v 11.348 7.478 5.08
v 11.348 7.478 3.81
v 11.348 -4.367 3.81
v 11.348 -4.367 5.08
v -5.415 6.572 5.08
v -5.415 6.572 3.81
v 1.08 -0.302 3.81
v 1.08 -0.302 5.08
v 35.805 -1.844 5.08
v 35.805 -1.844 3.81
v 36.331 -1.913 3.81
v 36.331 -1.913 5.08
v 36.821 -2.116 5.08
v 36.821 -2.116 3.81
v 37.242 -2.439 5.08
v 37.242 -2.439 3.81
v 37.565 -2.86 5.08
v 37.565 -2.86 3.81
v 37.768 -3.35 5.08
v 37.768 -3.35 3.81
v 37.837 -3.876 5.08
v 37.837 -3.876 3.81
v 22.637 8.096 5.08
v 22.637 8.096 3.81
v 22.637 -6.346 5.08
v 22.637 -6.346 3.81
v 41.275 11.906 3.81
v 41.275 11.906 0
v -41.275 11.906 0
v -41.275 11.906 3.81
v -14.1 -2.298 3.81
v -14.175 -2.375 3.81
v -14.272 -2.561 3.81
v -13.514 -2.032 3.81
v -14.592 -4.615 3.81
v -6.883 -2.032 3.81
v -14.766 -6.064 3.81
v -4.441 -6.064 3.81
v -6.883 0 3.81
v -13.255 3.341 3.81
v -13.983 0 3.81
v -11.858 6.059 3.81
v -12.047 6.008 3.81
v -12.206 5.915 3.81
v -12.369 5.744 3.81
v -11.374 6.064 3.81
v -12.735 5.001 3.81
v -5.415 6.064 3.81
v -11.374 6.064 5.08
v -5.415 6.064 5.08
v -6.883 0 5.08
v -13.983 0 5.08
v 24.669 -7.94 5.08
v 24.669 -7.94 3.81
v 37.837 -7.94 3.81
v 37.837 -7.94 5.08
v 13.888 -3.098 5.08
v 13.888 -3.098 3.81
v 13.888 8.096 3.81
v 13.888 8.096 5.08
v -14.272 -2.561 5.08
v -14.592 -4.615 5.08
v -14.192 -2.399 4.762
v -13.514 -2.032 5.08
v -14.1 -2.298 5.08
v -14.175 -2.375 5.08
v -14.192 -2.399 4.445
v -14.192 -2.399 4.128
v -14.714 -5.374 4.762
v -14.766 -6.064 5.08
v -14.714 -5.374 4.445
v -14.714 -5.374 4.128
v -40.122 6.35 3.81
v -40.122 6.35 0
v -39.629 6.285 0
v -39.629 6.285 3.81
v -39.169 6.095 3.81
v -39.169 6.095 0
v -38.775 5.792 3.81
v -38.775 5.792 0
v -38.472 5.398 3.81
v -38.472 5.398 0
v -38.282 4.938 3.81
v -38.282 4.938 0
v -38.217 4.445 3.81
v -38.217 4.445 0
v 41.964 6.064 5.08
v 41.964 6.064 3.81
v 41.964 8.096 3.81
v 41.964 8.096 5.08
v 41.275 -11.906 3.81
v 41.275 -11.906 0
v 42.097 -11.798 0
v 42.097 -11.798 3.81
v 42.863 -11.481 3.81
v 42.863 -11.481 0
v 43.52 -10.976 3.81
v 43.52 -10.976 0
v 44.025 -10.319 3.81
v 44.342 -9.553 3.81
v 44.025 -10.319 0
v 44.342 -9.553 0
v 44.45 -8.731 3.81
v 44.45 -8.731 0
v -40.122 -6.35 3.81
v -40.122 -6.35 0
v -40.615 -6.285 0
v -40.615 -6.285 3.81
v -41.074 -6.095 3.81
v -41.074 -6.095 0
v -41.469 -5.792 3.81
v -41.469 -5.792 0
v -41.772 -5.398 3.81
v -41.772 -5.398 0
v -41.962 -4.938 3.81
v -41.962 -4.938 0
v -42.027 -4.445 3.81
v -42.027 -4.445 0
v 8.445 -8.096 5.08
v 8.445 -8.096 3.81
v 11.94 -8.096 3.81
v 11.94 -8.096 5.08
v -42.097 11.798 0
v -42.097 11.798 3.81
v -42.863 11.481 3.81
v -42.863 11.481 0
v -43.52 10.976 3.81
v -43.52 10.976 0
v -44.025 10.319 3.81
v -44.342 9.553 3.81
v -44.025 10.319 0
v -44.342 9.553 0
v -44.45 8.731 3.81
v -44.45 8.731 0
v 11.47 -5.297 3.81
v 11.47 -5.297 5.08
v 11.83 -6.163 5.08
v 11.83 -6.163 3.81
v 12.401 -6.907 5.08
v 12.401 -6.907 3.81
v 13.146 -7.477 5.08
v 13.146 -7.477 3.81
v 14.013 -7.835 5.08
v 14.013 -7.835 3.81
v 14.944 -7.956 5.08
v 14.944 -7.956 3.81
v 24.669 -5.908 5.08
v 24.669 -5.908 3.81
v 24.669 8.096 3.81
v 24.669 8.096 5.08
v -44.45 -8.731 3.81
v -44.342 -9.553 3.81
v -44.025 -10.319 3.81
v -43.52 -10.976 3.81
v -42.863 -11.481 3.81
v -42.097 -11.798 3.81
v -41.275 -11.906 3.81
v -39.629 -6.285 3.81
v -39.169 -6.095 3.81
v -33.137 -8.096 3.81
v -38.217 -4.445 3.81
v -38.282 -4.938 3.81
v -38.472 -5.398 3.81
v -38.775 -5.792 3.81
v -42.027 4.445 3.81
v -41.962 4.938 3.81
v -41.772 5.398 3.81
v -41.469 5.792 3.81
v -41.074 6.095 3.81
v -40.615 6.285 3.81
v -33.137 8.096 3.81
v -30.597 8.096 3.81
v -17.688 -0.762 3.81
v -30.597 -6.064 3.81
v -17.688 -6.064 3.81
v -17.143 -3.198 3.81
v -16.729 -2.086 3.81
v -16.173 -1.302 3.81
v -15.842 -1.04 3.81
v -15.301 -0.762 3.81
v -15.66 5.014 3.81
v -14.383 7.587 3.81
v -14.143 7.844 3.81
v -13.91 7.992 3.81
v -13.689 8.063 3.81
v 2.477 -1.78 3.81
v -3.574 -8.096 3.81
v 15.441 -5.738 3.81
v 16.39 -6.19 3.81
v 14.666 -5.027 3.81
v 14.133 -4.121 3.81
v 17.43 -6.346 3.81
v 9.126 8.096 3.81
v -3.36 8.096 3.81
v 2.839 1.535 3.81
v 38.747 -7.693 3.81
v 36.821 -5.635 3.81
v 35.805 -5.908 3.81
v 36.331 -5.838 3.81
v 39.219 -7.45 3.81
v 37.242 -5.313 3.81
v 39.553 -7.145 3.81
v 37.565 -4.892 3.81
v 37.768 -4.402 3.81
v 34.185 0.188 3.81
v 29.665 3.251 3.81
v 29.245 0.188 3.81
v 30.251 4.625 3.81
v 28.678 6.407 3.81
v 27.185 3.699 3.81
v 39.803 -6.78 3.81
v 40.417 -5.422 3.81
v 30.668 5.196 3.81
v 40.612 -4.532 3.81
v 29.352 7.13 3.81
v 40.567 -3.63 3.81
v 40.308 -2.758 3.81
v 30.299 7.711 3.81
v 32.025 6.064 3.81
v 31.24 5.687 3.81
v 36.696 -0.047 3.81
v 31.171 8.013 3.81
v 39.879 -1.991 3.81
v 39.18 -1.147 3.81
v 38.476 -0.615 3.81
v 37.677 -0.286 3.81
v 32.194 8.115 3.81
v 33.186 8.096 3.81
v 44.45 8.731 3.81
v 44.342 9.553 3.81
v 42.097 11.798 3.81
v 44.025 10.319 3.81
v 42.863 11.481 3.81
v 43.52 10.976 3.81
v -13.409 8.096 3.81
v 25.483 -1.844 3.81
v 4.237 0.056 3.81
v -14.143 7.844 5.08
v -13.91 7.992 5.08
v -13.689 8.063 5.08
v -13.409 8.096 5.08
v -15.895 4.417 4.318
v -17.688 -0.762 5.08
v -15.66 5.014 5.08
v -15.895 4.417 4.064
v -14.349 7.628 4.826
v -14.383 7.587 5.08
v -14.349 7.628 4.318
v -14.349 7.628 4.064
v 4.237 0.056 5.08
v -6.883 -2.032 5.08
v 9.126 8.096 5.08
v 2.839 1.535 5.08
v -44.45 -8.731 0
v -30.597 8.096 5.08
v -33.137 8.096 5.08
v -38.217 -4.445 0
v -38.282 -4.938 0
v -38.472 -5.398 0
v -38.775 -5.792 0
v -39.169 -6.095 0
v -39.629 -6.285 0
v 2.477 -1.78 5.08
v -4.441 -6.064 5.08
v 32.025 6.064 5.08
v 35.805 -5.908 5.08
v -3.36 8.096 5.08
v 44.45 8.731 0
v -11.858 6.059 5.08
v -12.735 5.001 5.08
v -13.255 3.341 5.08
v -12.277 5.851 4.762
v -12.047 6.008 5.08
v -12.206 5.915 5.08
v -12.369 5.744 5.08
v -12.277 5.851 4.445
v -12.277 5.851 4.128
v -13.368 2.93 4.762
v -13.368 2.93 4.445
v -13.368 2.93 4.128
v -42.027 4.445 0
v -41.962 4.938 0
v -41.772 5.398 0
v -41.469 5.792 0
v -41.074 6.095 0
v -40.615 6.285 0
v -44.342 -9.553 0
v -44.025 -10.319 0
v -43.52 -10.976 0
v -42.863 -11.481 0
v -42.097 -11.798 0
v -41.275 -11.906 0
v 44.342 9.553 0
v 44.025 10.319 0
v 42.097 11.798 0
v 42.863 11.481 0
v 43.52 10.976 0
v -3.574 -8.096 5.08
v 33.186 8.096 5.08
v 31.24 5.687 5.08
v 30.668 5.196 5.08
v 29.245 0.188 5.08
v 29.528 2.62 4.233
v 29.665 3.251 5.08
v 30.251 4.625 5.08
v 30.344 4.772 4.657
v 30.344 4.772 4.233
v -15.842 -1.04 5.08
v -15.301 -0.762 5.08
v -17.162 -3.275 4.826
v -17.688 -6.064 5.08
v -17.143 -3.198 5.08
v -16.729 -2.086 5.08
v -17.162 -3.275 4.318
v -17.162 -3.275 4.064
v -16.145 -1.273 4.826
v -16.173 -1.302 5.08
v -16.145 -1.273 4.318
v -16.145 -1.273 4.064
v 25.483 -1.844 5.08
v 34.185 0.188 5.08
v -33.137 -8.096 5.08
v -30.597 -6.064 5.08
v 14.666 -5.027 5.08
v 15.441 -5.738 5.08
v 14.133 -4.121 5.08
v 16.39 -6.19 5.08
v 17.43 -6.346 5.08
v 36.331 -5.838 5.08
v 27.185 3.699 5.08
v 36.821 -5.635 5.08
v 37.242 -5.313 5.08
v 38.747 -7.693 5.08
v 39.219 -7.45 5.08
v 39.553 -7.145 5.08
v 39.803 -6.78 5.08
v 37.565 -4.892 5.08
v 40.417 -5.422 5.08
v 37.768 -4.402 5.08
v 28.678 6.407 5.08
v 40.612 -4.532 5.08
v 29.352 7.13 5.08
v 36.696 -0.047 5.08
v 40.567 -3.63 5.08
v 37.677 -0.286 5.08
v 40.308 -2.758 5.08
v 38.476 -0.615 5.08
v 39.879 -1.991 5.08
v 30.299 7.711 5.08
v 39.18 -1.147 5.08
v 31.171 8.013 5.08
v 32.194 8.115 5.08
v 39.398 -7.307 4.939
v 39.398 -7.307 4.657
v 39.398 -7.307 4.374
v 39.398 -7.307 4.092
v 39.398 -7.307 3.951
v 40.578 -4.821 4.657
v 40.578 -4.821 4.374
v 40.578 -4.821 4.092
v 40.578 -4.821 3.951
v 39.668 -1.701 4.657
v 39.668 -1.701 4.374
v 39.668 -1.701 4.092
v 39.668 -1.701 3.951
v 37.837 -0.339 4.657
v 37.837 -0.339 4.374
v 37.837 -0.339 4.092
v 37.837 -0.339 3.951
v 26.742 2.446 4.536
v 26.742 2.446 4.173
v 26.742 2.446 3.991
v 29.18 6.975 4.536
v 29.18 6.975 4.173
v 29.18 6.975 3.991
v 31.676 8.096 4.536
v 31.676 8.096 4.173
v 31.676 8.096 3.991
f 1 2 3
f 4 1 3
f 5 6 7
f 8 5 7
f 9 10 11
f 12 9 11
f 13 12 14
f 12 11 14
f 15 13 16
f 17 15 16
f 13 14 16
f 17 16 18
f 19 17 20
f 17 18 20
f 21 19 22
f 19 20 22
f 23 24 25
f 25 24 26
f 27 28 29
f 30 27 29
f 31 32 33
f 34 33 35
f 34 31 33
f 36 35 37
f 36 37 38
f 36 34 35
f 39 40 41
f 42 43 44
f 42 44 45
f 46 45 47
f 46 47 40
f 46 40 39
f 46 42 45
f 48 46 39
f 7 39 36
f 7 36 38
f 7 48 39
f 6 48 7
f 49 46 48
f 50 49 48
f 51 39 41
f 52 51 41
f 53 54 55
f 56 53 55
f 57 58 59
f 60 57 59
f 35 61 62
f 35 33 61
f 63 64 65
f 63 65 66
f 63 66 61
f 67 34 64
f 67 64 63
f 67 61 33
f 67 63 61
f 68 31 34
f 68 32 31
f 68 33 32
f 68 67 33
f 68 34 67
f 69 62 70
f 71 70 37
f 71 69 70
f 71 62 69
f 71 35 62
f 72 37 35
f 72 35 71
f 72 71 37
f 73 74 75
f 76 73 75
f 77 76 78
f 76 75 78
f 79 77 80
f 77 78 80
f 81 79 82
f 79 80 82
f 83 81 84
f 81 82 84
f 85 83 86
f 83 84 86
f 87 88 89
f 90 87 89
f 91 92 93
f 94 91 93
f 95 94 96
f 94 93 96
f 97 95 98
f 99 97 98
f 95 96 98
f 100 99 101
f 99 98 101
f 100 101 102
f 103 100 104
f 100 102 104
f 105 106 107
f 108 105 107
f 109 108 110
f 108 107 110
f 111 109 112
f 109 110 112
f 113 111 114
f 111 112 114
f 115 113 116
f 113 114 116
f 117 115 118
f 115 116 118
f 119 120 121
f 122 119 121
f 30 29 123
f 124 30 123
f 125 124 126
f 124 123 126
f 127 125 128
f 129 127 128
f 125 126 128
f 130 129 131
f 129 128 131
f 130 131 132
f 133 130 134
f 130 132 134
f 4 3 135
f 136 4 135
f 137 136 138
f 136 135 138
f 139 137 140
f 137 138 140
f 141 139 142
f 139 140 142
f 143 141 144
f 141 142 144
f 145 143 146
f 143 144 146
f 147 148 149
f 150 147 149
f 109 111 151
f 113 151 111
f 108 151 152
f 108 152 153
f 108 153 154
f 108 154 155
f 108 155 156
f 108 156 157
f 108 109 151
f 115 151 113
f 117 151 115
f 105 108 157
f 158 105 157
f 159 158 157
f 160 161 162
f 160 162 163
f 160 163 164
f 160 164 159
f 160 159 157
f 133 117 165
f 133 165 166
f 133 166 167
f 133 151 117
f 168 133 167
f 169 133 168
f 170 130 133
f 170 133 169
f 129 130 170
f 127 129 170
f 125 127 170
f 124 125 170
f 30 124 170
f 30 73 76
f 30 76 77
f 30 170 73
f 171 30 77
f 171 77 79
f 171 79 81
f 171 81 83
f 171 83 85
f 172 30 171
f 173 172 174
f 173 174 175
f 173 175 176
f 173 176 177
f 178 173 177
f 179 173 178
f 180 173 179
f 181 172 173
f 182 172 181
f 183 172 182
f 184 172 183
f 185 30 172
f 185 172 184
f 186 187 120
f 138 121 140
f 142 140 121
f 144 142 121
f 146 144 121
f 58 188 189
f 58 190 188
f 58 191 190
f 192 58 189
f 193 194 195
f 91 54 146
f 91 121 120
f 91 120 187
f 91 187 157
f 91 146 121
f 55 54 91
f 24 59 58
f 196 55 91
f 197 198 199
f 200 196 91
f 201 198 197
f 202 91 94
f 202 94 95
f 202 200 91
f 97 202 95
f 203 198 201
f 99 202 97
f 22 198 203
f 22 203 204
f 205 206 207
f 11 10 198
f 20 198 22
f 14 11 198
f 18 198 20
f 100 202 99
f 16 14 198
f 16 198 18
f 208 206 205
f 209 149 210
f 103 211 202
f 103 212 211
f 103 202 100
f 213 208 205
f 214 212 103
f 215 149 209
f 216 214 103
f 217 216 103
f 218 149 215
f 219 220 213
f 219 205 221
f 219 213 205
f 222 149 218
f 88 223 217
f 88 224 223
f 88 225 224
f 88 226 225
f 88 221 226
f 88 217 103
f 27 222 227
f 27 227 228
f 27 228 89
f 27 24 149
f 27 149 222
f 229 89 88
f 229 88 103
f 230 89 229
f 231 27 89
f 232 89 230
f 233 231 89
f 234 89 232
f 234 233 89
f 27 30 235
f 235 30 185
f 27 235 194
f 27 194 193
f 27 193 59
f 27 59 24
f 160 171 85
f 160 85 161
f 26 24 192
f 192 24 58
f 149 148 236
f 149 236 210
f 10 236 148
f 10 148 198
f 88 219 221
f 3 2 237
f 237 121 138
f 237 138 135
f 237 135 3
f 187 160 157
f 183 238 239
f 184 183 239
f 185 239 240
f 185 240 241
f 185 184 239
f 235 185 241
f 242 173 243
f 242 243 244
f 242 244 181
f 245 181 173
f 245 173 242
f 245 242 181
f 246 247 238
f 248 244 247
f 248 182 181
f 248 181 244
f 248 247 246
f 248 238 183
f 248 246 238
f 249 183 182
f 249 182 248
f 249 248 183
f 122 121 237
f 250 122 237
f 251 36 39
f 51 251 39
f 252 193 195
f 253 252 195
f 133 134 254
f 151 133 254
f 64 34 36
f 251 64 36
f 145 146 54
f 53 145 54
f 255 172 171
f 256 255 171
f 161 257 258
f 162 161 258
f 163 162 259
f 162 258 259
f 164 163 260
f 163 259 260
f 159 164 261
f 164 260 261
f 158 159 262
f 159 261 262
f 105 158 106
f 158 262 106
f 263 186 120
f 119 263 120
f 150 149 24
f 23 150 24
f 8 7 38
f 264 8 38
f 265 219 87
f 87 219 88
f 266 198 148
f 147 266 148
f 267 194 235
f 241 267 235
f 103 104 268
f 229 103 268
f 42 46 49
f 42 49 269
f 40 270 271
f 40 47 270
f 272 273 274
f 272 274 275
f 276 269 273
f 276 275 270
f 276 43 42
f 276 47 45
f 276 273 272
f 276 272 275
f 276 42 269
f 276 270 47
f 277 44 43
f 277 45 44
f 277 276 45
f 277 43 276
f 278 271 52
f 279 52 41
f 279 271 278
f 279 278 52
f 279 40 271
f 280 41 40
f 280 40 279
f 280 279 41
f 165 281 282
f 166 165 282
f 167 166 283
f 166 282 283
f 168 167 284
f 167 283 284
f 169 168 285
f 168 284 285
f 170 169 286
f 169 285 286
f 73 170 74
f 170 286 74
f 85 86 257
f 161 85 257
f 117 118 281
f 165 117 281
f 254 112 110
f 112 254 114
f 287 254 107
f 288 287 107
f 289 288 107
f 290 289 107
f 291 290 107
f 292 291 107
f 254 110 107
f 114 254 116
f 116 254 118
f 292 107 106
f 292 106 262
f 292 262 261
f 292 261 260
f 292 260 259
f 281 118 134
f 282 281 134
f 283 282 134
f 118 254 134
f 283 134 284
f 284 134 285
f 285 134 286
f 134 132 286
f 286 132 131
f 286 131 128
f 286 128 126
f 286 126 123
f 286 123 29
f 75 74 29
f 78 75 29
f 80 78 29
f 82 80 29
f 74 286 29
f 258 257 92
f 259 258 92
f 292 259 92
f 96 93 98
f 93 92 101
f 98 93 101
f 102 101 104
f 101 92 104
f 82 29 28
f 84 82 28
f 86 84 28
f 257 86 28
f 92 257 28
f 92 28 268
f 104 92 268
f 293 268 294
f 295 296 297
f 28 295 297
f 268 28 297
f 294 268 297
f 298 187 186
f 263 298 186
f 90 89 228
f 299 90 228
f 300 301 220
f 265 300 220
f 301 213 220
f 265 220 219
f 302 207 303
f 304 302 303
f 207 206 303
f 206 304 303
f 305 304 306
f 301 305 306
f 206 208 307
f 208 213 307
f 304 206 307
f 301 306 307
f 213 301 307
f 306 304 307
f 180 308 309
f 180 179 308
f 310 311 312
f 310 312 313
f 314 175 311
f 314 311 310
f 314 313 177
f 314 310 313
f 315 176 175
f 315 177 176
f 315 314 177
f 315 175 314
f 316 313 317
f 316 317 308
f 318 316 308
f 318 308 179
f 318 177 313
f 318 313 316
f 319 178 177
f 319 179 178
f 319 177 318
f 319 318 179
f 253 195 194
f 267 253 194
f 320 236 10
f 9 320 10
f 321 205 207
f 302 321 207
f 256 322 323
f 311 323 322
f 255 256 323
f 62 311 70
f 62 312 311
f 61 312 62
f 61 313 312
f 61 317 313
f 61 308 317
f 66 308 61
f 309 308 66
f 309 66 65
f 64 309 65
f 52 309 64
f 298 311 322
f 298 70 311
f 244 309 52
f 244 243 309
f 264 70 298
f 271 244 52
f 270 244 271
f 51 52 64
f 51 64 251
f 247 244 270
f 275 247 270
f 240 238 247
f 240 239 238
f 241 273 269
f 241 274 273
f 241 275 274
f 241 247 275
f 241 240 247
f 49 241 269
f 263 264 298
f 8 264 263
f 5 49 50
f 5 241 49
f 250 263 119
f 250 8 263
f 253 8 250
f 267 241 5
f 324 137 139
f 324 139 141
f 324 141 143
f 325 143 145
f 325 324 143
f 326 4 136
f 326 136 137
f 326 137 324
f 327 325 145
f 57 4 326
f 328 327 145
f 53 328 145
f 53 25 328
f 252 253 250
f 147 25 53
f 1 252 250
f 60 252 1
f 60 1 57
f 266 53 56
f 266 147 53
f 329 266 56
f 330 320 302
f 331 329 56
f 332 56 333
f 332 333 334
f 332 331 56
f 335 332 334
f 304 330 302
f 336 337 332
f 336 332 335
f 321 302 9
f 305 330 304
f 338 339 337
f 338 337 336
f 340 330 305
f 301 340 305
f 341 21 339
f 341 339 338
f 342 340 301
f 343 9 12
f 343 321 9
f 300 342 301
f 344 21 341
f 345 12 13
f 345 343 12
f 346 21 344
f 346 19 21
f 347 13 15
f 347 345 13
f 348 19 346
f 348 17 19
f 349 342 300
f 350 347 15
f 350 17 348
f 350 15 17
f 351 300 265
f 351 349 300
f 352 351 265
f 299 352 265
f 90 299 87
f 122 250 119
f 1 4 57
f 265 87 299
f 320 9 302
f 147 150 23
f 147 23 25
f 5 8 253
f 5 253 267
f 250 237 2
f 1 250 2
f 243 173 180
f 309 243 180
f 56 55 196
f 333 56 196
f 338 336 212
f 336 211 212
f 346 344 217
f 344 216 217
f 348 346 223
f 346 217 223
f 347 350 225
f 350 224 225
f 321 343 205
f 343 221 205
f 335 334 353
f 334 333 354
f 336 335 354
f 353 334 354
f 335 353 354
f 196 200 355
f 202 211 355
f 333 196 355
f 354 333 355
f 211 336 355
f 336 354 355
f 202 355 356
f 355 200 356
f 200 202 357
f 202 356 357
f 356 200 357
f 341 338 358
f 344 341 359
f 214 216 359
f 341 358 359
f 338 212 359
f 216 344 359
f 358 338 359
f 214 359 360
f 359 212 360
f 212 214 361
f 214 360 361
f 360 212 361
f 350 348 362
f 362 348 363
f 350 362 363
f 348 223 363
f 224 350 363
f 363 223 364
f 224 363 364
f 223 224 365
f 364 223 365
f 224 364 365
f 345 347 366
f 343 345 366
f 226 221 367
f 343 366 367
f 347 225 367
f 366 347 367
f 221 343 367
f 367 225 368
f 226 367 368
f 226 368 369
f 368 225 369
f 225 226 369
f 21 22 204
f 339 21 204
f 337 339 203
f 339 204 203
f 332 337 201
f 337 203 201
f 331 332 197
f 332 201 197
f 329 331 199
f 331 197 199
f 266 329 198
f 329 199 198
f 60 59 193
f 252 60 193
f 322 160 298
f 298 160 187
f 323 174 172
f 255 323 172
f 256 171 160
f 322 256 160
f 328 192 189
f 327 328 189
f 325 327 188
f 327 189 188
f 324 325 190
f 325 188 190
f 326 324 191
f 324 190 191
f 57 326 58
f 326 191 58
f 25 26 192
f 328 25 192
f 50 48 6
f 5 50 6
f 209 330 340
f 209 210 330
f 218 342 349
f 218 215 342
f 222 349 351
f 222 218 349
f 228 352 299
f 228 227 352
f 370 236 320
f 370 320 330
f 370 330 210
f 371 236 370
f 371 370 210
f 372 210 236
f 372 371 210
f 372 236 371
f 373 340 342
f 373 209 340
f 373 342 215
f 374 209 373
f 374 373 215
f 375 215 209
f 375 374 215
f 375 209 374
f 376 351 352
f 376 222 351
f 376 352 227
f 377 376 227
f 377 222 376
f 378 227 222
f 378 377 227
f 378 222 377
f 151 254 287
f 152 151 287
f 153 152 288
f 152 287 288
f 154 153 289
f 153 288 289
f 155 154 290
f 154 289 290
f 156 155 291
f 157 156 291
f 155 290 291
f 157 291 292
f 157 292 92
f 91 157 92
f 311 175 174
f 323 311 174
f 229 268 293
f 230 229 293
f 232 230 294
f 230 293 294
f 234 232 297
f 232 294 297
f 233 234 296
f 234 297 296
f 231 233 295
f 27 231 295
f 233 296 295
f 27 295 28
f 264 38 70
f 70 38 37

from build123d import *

# Parameters (mm, degrees)
F1_DEPTH = 3.81
F3_DEPTH = 1.27


with BuildPart() as f1:
    # F0 (on Top) → F1 (new body)
    with BuildSketch(Plane.XY):
        with BuildLine():
            Line((-41.275, -11.90625), (41.275, -11.90625))
            ThreePointArc((41.275, -11.90625), (43.5200640303, -10.9763140303), (44.45, -8.73125))
            Line((44.45, -8.73125), (44.45, 8.73125))
            ThreePointArc((44.45, 8.73125), (43.5200640303, 10.9763140303), (41.275, 11.90625))
            Line((41.275, 11.90625), (-41.275, 11.90625))
            ThreePointArc((-41.275, 11.90625), (-43.5200640303, 10.9763140303), (-44.45, 8.73125))
            Line((-44.45, 8.73125), (-44.45, -8.73125))
            ThreePointArc((-44.45, -8.73125), (-43.5200640303, -10.9763140303), (-41.275, -11.90625))
        make_face()
        with BuildLine():
            Line((-38.2169688356, 4.445), (-38.2169688356, -4.445))
            ThreePointArc((-38.2169688356, -4.445), (-38.7749304174, -5.7920384182), (-40.1219688356, -6.35))
            ThreePointArc((-40.1219688356, -6.35), (-41.4690072538, -5.7920384182), (-42.0269688356, -4.445))
            Line((-42.0269688356, -4.445), (-42.0269688356, 4.445))
            ThreePointArc((-42.0269688356, 4.445), (-41.4690072538, 5.7920384182), (-40.1219688356, 6.35))
            ThreePointArc((-40.1219688356, 6.35), (-38.7749304174, 5.7920384182), (-38.2169688356, 4.445))
        make_face(mode=Mode.SUBTRACT)
    extrude(amount=F1_DEPTH)

    # F2 (on face) → F3 (join)
    with BuildSketch(Plane.XY.offset(3.81)):
        with BuildLine():
            Line((-33.1369688356, 8.09625), (-33.1369688356, -8.09625))
            Line((-33.1369688356, -8.09625), (-14.9305017963, -8.09625))
            Line((-14.9305017963, -8.09625), (-4.4408244503, -8.09625))
            Line((-4.4408244503, -8.09625), (-4.4408244503, -6.06425))
            Line((-4.4408244503, -6.06425), (-14.7659257054, -6.06425))
            add(Edge.make_bspline(
                [(-13.513635844, -2.032), (-13.8611532829, -2.1980739704), (-14.3459285269, -2.2099492601), (-14.4823312004, -4.002820532), (-14.7172564306, -5.3877740164), (-14.7775029403, -5.761799907), (-14.7659257054, -6.06425)],
                knots=[0, 0, 0, 0, 0.2107594837, 0.5139383753, 0.8003027815, 1, 1, 1, 1], degree=3))
            Line((-13.513635844, -2.032), (-6.8832325343, -2.032))
            Line((-6.8832325343, -2.032), (-6.8832325343, 0))
            Line((-6.8832325343, 0), (-13.9832440764, 0))
            add(Edge.make_bspline(
                [(-11.374309659, 6.06425), (-11.7970469078, 6.0937481421), (-12.400656261, 6.0408242331), (-12.9628712261, 4.3407982551), (-13.3836406147, 2.9409234174), (-13.8567248974, 1.0073529425), (-13.9832440764, 0)],
                knots=[0, 0, 0, 0, 0.1854469036, 0.4247933811, 0.6668574102, 1, 1, 1, 1], degree=3))
            Line((-11.374309659, 6.06425), (-5.4148057359, 6.06425))
            Line((-5.4148057359, 6.06425), (-5.4148057359, 6.5723256238))
            Line((-5.4148057359, 6.5723256238), (-5.4148057359, 8.09625))
            Line((-5.4148057359, 8.09625), (-13.4092783555, 8.09625))
            add(Edge.make_bspline(
                [(-17.6879316568, -0.762), (-17.0853493776, 1.2922751779), (-16.7349072936, 2.3189827137), (-15.8911126674, 4.4121063422), (-15.0710282171, 6.5370694937), (-14.3847178975, 7.6672909404), (-13.9179741964, 8.0772032961), (-13.4092783555, 8.09625)],
                knots=[0, 0, 0, 0, 0.2707299894, 0.4717983457, 0.6911291675, 0.8524377102, 1, 1, 1, 1], degree=3))
            Line((-17.6879316568, -0.762), (-15.3005402535, -0.762))
            add(Edge.make_bspline(
                [(-17.6879316568, -6.06425), (-17.5631227568, -5.0804670724), (-17.5265823635, -5.0281161064), (-17.1728408985, -3.2023736826), (-16.8475061728, -2.1905918672), (-16.1243397189, -1.1537855527), (-15.7725399015, -0.9954859224), (-15.3005402535, -0.762)],
                knots=[0, 0, 0, 0, 0.2097857454, 0.4327627354, 0.6303900109, 0.8195013475, 1, 1, 1, 1], degree=3))
            Line((-17.6879316568, -6.06425), (-30.5969688356, -6.06425))
            Line((-30.5969688356, -6.06425), (-30.5969688356, 8.09625))
            Line((-30.5969688356, 8.09625), (-33.1369688356, 8.09625))
        make_face()
        Polygon((-4.4408244503, -6.06425), (-4.4408244503, -8.09625), (-3.57352963, -8.09625), (2.4774279686, -1.7803364764), (1.0801424445, -0.3015341148), align=None)
        Polygon((2.8394880429, 1.5348487183), (1.0801424445, -0.3015341148), (2.4774279686, -1.7803364764), (4.2367735671, 0.0560463568), align=None)
        Polygon((-5.4148057359, 6.5723256238), (1.0801424445, -0.3015341148), (2.8394880429, 1.5348487183), (-3.3602255002, 8.09625), (-5.4148057359, 8.09625), align=None)
        Polygon((4.2367735671, 0.0560463568), (2.4774279686, -1.7803364764), (8.4451859107, -8.09625), (11.9396863995, -8.09625), align=None)
        Polygon((9.1256350578, 8.09625), (2.8394880429, 1.5348487183), (4.2367735671, 0.0560463568), (11.3477446789, 7.4783886686), (11.9396863995, 8.09625), align=None)
        with BuildLine():
            Line((11.9396863995, 8.09625), (11.3477446789, 7.4783886686))
            Line((11.3477446789, 7.4783886686), (11.3477446789, -4.3666326941))
            ThreePointArc((11.3477446789, -4.3666326941), (12.4013025669, -6.9070776733), (14.9435433322, -7.9562949086))
            Line((14.9435433322, -7.9562949086), (24.6688841279, -7.9396838649))
            Line((24.6688841279, -7.9396838649), (24.6688841279, -5.9076838649))
            Line((24.6688841279, -5.9076838649), (24.6688841279, 8.09625))
            Line((24.6688841279, 8.09625), (22.6368841279, 8.09625))
            Line((22.6368841279, 8.09625), (22.6368841279, -6.3459635714))
            Line((22.6368841279, -6.3459635714), (17.4303608148, -6.3459635714))
            ThreePointArc((17.4303608148, -6.3459635714), (15.0273352941, -5.4111473397), (13.8877446789, -3.0981954877))
            Line((13.8877446789, -3.0981954877), (13.8877446789, 8.09625))
            Line((13.8877446789, 8.09625), (11.9396863995, 8.09625))
        make_face()
        with BuildLine():
            Line((24.6688841279, -5.9076838649), (24.6688841279, -7.9396838649))
            Line((24.6688841279, -7.9396838649), (37.8373786807, -7.9396838649))
            add(Edge.make_bspline(
                [(37.8373786807, -7.9396838649), (38.4882097852, -7.8114506673), (39.5178452641, -7.496112843), (40.126883642, -6.0991216047), (40.7050802618, -4.8496198201), (40.5764483682, -3.0792560488), (39.7269584552, -1.6891831447), (38.8078867235, -0.737734011), (37.8093798081, -0.2945075978), (36.4599787891, 0.0450284712), (34.7408936011, 0.1986066109), (34.1846869754, 0.1883161351)],
                knots=[0, 0, 0, 0, 0.1171066483, 0.2235125119, 0.3294259119, 0.4469201861, 0.5621007917, 0.6644797625, 0.7558675462, 0.8648976622, 1, 1, 1, 1], degree=3))
            Line((34.1846869754, 0.1883161351), (29.2448235171, 0.1883161351))
            add(Edge.make_bspline(
                [(29.2448235171, 0.1883161351), (29.4537920477, 0.9562330478), (29.3473473778, 2.6260589886), (30.233558549, 4.9044254628), (31.1930093172, 5.7724721465), (32.0247337222, 6.06425)],
                knots=[0, 0, 0, 0, 0.3448282666, 0.6791586925, 1, 1, 1, 1], degree=3))
            Line((32.0247337222, 6.06425), (41.9643558562, 6.06425))
            Line((41.9643558562, 6.06425), (41.9643558562, 8.09625))
            Line((41.9643558562, 8.09625), (33.1864038537, 8.09625))
            add(Edge.make_bspline(
                [(25.4828148948, -1.8436838649), (25.680435092, -1.0761085159), (26.0689778517, -0.0750567317), (26.6999114572, 2.5205566329), (27.6657264028, 4.9797411998), (29.0563776932, 7.0524197018), (30.311457036, 7.7653827779), (31.6423733416, 8.1991717396), (32.7591321523, 8.0866993991), (33.1864038537, 8.09625)],
                knots=[0, 0, 0, 0, 0.1419463815, 0.3049859755, 0.4748327911, 0.63374866, 0.7540605138, 0.8743708506, 1, 1, 1, 1], degree=3))
            Line((25.4828148948, -1.8436838649), (35.8053786807, -1.8436838649))
            ThreePointArc((35.8053786807, -1.8436838649), (37.2422196601, -2.4388428856), (37.8373786807, -3.8756838649))
            ThreePointArc((37.8373786807, -3.8756838649), (37.2422196601, -5.3125248443), (35.8053786807, -5.9076838649))
            Line((35.8053786807, -5.9076838649), (24.6688841279, -5.9076838649))
        make_face()
    extrude(amount=F3_DEPTH)


solid = f1.part
